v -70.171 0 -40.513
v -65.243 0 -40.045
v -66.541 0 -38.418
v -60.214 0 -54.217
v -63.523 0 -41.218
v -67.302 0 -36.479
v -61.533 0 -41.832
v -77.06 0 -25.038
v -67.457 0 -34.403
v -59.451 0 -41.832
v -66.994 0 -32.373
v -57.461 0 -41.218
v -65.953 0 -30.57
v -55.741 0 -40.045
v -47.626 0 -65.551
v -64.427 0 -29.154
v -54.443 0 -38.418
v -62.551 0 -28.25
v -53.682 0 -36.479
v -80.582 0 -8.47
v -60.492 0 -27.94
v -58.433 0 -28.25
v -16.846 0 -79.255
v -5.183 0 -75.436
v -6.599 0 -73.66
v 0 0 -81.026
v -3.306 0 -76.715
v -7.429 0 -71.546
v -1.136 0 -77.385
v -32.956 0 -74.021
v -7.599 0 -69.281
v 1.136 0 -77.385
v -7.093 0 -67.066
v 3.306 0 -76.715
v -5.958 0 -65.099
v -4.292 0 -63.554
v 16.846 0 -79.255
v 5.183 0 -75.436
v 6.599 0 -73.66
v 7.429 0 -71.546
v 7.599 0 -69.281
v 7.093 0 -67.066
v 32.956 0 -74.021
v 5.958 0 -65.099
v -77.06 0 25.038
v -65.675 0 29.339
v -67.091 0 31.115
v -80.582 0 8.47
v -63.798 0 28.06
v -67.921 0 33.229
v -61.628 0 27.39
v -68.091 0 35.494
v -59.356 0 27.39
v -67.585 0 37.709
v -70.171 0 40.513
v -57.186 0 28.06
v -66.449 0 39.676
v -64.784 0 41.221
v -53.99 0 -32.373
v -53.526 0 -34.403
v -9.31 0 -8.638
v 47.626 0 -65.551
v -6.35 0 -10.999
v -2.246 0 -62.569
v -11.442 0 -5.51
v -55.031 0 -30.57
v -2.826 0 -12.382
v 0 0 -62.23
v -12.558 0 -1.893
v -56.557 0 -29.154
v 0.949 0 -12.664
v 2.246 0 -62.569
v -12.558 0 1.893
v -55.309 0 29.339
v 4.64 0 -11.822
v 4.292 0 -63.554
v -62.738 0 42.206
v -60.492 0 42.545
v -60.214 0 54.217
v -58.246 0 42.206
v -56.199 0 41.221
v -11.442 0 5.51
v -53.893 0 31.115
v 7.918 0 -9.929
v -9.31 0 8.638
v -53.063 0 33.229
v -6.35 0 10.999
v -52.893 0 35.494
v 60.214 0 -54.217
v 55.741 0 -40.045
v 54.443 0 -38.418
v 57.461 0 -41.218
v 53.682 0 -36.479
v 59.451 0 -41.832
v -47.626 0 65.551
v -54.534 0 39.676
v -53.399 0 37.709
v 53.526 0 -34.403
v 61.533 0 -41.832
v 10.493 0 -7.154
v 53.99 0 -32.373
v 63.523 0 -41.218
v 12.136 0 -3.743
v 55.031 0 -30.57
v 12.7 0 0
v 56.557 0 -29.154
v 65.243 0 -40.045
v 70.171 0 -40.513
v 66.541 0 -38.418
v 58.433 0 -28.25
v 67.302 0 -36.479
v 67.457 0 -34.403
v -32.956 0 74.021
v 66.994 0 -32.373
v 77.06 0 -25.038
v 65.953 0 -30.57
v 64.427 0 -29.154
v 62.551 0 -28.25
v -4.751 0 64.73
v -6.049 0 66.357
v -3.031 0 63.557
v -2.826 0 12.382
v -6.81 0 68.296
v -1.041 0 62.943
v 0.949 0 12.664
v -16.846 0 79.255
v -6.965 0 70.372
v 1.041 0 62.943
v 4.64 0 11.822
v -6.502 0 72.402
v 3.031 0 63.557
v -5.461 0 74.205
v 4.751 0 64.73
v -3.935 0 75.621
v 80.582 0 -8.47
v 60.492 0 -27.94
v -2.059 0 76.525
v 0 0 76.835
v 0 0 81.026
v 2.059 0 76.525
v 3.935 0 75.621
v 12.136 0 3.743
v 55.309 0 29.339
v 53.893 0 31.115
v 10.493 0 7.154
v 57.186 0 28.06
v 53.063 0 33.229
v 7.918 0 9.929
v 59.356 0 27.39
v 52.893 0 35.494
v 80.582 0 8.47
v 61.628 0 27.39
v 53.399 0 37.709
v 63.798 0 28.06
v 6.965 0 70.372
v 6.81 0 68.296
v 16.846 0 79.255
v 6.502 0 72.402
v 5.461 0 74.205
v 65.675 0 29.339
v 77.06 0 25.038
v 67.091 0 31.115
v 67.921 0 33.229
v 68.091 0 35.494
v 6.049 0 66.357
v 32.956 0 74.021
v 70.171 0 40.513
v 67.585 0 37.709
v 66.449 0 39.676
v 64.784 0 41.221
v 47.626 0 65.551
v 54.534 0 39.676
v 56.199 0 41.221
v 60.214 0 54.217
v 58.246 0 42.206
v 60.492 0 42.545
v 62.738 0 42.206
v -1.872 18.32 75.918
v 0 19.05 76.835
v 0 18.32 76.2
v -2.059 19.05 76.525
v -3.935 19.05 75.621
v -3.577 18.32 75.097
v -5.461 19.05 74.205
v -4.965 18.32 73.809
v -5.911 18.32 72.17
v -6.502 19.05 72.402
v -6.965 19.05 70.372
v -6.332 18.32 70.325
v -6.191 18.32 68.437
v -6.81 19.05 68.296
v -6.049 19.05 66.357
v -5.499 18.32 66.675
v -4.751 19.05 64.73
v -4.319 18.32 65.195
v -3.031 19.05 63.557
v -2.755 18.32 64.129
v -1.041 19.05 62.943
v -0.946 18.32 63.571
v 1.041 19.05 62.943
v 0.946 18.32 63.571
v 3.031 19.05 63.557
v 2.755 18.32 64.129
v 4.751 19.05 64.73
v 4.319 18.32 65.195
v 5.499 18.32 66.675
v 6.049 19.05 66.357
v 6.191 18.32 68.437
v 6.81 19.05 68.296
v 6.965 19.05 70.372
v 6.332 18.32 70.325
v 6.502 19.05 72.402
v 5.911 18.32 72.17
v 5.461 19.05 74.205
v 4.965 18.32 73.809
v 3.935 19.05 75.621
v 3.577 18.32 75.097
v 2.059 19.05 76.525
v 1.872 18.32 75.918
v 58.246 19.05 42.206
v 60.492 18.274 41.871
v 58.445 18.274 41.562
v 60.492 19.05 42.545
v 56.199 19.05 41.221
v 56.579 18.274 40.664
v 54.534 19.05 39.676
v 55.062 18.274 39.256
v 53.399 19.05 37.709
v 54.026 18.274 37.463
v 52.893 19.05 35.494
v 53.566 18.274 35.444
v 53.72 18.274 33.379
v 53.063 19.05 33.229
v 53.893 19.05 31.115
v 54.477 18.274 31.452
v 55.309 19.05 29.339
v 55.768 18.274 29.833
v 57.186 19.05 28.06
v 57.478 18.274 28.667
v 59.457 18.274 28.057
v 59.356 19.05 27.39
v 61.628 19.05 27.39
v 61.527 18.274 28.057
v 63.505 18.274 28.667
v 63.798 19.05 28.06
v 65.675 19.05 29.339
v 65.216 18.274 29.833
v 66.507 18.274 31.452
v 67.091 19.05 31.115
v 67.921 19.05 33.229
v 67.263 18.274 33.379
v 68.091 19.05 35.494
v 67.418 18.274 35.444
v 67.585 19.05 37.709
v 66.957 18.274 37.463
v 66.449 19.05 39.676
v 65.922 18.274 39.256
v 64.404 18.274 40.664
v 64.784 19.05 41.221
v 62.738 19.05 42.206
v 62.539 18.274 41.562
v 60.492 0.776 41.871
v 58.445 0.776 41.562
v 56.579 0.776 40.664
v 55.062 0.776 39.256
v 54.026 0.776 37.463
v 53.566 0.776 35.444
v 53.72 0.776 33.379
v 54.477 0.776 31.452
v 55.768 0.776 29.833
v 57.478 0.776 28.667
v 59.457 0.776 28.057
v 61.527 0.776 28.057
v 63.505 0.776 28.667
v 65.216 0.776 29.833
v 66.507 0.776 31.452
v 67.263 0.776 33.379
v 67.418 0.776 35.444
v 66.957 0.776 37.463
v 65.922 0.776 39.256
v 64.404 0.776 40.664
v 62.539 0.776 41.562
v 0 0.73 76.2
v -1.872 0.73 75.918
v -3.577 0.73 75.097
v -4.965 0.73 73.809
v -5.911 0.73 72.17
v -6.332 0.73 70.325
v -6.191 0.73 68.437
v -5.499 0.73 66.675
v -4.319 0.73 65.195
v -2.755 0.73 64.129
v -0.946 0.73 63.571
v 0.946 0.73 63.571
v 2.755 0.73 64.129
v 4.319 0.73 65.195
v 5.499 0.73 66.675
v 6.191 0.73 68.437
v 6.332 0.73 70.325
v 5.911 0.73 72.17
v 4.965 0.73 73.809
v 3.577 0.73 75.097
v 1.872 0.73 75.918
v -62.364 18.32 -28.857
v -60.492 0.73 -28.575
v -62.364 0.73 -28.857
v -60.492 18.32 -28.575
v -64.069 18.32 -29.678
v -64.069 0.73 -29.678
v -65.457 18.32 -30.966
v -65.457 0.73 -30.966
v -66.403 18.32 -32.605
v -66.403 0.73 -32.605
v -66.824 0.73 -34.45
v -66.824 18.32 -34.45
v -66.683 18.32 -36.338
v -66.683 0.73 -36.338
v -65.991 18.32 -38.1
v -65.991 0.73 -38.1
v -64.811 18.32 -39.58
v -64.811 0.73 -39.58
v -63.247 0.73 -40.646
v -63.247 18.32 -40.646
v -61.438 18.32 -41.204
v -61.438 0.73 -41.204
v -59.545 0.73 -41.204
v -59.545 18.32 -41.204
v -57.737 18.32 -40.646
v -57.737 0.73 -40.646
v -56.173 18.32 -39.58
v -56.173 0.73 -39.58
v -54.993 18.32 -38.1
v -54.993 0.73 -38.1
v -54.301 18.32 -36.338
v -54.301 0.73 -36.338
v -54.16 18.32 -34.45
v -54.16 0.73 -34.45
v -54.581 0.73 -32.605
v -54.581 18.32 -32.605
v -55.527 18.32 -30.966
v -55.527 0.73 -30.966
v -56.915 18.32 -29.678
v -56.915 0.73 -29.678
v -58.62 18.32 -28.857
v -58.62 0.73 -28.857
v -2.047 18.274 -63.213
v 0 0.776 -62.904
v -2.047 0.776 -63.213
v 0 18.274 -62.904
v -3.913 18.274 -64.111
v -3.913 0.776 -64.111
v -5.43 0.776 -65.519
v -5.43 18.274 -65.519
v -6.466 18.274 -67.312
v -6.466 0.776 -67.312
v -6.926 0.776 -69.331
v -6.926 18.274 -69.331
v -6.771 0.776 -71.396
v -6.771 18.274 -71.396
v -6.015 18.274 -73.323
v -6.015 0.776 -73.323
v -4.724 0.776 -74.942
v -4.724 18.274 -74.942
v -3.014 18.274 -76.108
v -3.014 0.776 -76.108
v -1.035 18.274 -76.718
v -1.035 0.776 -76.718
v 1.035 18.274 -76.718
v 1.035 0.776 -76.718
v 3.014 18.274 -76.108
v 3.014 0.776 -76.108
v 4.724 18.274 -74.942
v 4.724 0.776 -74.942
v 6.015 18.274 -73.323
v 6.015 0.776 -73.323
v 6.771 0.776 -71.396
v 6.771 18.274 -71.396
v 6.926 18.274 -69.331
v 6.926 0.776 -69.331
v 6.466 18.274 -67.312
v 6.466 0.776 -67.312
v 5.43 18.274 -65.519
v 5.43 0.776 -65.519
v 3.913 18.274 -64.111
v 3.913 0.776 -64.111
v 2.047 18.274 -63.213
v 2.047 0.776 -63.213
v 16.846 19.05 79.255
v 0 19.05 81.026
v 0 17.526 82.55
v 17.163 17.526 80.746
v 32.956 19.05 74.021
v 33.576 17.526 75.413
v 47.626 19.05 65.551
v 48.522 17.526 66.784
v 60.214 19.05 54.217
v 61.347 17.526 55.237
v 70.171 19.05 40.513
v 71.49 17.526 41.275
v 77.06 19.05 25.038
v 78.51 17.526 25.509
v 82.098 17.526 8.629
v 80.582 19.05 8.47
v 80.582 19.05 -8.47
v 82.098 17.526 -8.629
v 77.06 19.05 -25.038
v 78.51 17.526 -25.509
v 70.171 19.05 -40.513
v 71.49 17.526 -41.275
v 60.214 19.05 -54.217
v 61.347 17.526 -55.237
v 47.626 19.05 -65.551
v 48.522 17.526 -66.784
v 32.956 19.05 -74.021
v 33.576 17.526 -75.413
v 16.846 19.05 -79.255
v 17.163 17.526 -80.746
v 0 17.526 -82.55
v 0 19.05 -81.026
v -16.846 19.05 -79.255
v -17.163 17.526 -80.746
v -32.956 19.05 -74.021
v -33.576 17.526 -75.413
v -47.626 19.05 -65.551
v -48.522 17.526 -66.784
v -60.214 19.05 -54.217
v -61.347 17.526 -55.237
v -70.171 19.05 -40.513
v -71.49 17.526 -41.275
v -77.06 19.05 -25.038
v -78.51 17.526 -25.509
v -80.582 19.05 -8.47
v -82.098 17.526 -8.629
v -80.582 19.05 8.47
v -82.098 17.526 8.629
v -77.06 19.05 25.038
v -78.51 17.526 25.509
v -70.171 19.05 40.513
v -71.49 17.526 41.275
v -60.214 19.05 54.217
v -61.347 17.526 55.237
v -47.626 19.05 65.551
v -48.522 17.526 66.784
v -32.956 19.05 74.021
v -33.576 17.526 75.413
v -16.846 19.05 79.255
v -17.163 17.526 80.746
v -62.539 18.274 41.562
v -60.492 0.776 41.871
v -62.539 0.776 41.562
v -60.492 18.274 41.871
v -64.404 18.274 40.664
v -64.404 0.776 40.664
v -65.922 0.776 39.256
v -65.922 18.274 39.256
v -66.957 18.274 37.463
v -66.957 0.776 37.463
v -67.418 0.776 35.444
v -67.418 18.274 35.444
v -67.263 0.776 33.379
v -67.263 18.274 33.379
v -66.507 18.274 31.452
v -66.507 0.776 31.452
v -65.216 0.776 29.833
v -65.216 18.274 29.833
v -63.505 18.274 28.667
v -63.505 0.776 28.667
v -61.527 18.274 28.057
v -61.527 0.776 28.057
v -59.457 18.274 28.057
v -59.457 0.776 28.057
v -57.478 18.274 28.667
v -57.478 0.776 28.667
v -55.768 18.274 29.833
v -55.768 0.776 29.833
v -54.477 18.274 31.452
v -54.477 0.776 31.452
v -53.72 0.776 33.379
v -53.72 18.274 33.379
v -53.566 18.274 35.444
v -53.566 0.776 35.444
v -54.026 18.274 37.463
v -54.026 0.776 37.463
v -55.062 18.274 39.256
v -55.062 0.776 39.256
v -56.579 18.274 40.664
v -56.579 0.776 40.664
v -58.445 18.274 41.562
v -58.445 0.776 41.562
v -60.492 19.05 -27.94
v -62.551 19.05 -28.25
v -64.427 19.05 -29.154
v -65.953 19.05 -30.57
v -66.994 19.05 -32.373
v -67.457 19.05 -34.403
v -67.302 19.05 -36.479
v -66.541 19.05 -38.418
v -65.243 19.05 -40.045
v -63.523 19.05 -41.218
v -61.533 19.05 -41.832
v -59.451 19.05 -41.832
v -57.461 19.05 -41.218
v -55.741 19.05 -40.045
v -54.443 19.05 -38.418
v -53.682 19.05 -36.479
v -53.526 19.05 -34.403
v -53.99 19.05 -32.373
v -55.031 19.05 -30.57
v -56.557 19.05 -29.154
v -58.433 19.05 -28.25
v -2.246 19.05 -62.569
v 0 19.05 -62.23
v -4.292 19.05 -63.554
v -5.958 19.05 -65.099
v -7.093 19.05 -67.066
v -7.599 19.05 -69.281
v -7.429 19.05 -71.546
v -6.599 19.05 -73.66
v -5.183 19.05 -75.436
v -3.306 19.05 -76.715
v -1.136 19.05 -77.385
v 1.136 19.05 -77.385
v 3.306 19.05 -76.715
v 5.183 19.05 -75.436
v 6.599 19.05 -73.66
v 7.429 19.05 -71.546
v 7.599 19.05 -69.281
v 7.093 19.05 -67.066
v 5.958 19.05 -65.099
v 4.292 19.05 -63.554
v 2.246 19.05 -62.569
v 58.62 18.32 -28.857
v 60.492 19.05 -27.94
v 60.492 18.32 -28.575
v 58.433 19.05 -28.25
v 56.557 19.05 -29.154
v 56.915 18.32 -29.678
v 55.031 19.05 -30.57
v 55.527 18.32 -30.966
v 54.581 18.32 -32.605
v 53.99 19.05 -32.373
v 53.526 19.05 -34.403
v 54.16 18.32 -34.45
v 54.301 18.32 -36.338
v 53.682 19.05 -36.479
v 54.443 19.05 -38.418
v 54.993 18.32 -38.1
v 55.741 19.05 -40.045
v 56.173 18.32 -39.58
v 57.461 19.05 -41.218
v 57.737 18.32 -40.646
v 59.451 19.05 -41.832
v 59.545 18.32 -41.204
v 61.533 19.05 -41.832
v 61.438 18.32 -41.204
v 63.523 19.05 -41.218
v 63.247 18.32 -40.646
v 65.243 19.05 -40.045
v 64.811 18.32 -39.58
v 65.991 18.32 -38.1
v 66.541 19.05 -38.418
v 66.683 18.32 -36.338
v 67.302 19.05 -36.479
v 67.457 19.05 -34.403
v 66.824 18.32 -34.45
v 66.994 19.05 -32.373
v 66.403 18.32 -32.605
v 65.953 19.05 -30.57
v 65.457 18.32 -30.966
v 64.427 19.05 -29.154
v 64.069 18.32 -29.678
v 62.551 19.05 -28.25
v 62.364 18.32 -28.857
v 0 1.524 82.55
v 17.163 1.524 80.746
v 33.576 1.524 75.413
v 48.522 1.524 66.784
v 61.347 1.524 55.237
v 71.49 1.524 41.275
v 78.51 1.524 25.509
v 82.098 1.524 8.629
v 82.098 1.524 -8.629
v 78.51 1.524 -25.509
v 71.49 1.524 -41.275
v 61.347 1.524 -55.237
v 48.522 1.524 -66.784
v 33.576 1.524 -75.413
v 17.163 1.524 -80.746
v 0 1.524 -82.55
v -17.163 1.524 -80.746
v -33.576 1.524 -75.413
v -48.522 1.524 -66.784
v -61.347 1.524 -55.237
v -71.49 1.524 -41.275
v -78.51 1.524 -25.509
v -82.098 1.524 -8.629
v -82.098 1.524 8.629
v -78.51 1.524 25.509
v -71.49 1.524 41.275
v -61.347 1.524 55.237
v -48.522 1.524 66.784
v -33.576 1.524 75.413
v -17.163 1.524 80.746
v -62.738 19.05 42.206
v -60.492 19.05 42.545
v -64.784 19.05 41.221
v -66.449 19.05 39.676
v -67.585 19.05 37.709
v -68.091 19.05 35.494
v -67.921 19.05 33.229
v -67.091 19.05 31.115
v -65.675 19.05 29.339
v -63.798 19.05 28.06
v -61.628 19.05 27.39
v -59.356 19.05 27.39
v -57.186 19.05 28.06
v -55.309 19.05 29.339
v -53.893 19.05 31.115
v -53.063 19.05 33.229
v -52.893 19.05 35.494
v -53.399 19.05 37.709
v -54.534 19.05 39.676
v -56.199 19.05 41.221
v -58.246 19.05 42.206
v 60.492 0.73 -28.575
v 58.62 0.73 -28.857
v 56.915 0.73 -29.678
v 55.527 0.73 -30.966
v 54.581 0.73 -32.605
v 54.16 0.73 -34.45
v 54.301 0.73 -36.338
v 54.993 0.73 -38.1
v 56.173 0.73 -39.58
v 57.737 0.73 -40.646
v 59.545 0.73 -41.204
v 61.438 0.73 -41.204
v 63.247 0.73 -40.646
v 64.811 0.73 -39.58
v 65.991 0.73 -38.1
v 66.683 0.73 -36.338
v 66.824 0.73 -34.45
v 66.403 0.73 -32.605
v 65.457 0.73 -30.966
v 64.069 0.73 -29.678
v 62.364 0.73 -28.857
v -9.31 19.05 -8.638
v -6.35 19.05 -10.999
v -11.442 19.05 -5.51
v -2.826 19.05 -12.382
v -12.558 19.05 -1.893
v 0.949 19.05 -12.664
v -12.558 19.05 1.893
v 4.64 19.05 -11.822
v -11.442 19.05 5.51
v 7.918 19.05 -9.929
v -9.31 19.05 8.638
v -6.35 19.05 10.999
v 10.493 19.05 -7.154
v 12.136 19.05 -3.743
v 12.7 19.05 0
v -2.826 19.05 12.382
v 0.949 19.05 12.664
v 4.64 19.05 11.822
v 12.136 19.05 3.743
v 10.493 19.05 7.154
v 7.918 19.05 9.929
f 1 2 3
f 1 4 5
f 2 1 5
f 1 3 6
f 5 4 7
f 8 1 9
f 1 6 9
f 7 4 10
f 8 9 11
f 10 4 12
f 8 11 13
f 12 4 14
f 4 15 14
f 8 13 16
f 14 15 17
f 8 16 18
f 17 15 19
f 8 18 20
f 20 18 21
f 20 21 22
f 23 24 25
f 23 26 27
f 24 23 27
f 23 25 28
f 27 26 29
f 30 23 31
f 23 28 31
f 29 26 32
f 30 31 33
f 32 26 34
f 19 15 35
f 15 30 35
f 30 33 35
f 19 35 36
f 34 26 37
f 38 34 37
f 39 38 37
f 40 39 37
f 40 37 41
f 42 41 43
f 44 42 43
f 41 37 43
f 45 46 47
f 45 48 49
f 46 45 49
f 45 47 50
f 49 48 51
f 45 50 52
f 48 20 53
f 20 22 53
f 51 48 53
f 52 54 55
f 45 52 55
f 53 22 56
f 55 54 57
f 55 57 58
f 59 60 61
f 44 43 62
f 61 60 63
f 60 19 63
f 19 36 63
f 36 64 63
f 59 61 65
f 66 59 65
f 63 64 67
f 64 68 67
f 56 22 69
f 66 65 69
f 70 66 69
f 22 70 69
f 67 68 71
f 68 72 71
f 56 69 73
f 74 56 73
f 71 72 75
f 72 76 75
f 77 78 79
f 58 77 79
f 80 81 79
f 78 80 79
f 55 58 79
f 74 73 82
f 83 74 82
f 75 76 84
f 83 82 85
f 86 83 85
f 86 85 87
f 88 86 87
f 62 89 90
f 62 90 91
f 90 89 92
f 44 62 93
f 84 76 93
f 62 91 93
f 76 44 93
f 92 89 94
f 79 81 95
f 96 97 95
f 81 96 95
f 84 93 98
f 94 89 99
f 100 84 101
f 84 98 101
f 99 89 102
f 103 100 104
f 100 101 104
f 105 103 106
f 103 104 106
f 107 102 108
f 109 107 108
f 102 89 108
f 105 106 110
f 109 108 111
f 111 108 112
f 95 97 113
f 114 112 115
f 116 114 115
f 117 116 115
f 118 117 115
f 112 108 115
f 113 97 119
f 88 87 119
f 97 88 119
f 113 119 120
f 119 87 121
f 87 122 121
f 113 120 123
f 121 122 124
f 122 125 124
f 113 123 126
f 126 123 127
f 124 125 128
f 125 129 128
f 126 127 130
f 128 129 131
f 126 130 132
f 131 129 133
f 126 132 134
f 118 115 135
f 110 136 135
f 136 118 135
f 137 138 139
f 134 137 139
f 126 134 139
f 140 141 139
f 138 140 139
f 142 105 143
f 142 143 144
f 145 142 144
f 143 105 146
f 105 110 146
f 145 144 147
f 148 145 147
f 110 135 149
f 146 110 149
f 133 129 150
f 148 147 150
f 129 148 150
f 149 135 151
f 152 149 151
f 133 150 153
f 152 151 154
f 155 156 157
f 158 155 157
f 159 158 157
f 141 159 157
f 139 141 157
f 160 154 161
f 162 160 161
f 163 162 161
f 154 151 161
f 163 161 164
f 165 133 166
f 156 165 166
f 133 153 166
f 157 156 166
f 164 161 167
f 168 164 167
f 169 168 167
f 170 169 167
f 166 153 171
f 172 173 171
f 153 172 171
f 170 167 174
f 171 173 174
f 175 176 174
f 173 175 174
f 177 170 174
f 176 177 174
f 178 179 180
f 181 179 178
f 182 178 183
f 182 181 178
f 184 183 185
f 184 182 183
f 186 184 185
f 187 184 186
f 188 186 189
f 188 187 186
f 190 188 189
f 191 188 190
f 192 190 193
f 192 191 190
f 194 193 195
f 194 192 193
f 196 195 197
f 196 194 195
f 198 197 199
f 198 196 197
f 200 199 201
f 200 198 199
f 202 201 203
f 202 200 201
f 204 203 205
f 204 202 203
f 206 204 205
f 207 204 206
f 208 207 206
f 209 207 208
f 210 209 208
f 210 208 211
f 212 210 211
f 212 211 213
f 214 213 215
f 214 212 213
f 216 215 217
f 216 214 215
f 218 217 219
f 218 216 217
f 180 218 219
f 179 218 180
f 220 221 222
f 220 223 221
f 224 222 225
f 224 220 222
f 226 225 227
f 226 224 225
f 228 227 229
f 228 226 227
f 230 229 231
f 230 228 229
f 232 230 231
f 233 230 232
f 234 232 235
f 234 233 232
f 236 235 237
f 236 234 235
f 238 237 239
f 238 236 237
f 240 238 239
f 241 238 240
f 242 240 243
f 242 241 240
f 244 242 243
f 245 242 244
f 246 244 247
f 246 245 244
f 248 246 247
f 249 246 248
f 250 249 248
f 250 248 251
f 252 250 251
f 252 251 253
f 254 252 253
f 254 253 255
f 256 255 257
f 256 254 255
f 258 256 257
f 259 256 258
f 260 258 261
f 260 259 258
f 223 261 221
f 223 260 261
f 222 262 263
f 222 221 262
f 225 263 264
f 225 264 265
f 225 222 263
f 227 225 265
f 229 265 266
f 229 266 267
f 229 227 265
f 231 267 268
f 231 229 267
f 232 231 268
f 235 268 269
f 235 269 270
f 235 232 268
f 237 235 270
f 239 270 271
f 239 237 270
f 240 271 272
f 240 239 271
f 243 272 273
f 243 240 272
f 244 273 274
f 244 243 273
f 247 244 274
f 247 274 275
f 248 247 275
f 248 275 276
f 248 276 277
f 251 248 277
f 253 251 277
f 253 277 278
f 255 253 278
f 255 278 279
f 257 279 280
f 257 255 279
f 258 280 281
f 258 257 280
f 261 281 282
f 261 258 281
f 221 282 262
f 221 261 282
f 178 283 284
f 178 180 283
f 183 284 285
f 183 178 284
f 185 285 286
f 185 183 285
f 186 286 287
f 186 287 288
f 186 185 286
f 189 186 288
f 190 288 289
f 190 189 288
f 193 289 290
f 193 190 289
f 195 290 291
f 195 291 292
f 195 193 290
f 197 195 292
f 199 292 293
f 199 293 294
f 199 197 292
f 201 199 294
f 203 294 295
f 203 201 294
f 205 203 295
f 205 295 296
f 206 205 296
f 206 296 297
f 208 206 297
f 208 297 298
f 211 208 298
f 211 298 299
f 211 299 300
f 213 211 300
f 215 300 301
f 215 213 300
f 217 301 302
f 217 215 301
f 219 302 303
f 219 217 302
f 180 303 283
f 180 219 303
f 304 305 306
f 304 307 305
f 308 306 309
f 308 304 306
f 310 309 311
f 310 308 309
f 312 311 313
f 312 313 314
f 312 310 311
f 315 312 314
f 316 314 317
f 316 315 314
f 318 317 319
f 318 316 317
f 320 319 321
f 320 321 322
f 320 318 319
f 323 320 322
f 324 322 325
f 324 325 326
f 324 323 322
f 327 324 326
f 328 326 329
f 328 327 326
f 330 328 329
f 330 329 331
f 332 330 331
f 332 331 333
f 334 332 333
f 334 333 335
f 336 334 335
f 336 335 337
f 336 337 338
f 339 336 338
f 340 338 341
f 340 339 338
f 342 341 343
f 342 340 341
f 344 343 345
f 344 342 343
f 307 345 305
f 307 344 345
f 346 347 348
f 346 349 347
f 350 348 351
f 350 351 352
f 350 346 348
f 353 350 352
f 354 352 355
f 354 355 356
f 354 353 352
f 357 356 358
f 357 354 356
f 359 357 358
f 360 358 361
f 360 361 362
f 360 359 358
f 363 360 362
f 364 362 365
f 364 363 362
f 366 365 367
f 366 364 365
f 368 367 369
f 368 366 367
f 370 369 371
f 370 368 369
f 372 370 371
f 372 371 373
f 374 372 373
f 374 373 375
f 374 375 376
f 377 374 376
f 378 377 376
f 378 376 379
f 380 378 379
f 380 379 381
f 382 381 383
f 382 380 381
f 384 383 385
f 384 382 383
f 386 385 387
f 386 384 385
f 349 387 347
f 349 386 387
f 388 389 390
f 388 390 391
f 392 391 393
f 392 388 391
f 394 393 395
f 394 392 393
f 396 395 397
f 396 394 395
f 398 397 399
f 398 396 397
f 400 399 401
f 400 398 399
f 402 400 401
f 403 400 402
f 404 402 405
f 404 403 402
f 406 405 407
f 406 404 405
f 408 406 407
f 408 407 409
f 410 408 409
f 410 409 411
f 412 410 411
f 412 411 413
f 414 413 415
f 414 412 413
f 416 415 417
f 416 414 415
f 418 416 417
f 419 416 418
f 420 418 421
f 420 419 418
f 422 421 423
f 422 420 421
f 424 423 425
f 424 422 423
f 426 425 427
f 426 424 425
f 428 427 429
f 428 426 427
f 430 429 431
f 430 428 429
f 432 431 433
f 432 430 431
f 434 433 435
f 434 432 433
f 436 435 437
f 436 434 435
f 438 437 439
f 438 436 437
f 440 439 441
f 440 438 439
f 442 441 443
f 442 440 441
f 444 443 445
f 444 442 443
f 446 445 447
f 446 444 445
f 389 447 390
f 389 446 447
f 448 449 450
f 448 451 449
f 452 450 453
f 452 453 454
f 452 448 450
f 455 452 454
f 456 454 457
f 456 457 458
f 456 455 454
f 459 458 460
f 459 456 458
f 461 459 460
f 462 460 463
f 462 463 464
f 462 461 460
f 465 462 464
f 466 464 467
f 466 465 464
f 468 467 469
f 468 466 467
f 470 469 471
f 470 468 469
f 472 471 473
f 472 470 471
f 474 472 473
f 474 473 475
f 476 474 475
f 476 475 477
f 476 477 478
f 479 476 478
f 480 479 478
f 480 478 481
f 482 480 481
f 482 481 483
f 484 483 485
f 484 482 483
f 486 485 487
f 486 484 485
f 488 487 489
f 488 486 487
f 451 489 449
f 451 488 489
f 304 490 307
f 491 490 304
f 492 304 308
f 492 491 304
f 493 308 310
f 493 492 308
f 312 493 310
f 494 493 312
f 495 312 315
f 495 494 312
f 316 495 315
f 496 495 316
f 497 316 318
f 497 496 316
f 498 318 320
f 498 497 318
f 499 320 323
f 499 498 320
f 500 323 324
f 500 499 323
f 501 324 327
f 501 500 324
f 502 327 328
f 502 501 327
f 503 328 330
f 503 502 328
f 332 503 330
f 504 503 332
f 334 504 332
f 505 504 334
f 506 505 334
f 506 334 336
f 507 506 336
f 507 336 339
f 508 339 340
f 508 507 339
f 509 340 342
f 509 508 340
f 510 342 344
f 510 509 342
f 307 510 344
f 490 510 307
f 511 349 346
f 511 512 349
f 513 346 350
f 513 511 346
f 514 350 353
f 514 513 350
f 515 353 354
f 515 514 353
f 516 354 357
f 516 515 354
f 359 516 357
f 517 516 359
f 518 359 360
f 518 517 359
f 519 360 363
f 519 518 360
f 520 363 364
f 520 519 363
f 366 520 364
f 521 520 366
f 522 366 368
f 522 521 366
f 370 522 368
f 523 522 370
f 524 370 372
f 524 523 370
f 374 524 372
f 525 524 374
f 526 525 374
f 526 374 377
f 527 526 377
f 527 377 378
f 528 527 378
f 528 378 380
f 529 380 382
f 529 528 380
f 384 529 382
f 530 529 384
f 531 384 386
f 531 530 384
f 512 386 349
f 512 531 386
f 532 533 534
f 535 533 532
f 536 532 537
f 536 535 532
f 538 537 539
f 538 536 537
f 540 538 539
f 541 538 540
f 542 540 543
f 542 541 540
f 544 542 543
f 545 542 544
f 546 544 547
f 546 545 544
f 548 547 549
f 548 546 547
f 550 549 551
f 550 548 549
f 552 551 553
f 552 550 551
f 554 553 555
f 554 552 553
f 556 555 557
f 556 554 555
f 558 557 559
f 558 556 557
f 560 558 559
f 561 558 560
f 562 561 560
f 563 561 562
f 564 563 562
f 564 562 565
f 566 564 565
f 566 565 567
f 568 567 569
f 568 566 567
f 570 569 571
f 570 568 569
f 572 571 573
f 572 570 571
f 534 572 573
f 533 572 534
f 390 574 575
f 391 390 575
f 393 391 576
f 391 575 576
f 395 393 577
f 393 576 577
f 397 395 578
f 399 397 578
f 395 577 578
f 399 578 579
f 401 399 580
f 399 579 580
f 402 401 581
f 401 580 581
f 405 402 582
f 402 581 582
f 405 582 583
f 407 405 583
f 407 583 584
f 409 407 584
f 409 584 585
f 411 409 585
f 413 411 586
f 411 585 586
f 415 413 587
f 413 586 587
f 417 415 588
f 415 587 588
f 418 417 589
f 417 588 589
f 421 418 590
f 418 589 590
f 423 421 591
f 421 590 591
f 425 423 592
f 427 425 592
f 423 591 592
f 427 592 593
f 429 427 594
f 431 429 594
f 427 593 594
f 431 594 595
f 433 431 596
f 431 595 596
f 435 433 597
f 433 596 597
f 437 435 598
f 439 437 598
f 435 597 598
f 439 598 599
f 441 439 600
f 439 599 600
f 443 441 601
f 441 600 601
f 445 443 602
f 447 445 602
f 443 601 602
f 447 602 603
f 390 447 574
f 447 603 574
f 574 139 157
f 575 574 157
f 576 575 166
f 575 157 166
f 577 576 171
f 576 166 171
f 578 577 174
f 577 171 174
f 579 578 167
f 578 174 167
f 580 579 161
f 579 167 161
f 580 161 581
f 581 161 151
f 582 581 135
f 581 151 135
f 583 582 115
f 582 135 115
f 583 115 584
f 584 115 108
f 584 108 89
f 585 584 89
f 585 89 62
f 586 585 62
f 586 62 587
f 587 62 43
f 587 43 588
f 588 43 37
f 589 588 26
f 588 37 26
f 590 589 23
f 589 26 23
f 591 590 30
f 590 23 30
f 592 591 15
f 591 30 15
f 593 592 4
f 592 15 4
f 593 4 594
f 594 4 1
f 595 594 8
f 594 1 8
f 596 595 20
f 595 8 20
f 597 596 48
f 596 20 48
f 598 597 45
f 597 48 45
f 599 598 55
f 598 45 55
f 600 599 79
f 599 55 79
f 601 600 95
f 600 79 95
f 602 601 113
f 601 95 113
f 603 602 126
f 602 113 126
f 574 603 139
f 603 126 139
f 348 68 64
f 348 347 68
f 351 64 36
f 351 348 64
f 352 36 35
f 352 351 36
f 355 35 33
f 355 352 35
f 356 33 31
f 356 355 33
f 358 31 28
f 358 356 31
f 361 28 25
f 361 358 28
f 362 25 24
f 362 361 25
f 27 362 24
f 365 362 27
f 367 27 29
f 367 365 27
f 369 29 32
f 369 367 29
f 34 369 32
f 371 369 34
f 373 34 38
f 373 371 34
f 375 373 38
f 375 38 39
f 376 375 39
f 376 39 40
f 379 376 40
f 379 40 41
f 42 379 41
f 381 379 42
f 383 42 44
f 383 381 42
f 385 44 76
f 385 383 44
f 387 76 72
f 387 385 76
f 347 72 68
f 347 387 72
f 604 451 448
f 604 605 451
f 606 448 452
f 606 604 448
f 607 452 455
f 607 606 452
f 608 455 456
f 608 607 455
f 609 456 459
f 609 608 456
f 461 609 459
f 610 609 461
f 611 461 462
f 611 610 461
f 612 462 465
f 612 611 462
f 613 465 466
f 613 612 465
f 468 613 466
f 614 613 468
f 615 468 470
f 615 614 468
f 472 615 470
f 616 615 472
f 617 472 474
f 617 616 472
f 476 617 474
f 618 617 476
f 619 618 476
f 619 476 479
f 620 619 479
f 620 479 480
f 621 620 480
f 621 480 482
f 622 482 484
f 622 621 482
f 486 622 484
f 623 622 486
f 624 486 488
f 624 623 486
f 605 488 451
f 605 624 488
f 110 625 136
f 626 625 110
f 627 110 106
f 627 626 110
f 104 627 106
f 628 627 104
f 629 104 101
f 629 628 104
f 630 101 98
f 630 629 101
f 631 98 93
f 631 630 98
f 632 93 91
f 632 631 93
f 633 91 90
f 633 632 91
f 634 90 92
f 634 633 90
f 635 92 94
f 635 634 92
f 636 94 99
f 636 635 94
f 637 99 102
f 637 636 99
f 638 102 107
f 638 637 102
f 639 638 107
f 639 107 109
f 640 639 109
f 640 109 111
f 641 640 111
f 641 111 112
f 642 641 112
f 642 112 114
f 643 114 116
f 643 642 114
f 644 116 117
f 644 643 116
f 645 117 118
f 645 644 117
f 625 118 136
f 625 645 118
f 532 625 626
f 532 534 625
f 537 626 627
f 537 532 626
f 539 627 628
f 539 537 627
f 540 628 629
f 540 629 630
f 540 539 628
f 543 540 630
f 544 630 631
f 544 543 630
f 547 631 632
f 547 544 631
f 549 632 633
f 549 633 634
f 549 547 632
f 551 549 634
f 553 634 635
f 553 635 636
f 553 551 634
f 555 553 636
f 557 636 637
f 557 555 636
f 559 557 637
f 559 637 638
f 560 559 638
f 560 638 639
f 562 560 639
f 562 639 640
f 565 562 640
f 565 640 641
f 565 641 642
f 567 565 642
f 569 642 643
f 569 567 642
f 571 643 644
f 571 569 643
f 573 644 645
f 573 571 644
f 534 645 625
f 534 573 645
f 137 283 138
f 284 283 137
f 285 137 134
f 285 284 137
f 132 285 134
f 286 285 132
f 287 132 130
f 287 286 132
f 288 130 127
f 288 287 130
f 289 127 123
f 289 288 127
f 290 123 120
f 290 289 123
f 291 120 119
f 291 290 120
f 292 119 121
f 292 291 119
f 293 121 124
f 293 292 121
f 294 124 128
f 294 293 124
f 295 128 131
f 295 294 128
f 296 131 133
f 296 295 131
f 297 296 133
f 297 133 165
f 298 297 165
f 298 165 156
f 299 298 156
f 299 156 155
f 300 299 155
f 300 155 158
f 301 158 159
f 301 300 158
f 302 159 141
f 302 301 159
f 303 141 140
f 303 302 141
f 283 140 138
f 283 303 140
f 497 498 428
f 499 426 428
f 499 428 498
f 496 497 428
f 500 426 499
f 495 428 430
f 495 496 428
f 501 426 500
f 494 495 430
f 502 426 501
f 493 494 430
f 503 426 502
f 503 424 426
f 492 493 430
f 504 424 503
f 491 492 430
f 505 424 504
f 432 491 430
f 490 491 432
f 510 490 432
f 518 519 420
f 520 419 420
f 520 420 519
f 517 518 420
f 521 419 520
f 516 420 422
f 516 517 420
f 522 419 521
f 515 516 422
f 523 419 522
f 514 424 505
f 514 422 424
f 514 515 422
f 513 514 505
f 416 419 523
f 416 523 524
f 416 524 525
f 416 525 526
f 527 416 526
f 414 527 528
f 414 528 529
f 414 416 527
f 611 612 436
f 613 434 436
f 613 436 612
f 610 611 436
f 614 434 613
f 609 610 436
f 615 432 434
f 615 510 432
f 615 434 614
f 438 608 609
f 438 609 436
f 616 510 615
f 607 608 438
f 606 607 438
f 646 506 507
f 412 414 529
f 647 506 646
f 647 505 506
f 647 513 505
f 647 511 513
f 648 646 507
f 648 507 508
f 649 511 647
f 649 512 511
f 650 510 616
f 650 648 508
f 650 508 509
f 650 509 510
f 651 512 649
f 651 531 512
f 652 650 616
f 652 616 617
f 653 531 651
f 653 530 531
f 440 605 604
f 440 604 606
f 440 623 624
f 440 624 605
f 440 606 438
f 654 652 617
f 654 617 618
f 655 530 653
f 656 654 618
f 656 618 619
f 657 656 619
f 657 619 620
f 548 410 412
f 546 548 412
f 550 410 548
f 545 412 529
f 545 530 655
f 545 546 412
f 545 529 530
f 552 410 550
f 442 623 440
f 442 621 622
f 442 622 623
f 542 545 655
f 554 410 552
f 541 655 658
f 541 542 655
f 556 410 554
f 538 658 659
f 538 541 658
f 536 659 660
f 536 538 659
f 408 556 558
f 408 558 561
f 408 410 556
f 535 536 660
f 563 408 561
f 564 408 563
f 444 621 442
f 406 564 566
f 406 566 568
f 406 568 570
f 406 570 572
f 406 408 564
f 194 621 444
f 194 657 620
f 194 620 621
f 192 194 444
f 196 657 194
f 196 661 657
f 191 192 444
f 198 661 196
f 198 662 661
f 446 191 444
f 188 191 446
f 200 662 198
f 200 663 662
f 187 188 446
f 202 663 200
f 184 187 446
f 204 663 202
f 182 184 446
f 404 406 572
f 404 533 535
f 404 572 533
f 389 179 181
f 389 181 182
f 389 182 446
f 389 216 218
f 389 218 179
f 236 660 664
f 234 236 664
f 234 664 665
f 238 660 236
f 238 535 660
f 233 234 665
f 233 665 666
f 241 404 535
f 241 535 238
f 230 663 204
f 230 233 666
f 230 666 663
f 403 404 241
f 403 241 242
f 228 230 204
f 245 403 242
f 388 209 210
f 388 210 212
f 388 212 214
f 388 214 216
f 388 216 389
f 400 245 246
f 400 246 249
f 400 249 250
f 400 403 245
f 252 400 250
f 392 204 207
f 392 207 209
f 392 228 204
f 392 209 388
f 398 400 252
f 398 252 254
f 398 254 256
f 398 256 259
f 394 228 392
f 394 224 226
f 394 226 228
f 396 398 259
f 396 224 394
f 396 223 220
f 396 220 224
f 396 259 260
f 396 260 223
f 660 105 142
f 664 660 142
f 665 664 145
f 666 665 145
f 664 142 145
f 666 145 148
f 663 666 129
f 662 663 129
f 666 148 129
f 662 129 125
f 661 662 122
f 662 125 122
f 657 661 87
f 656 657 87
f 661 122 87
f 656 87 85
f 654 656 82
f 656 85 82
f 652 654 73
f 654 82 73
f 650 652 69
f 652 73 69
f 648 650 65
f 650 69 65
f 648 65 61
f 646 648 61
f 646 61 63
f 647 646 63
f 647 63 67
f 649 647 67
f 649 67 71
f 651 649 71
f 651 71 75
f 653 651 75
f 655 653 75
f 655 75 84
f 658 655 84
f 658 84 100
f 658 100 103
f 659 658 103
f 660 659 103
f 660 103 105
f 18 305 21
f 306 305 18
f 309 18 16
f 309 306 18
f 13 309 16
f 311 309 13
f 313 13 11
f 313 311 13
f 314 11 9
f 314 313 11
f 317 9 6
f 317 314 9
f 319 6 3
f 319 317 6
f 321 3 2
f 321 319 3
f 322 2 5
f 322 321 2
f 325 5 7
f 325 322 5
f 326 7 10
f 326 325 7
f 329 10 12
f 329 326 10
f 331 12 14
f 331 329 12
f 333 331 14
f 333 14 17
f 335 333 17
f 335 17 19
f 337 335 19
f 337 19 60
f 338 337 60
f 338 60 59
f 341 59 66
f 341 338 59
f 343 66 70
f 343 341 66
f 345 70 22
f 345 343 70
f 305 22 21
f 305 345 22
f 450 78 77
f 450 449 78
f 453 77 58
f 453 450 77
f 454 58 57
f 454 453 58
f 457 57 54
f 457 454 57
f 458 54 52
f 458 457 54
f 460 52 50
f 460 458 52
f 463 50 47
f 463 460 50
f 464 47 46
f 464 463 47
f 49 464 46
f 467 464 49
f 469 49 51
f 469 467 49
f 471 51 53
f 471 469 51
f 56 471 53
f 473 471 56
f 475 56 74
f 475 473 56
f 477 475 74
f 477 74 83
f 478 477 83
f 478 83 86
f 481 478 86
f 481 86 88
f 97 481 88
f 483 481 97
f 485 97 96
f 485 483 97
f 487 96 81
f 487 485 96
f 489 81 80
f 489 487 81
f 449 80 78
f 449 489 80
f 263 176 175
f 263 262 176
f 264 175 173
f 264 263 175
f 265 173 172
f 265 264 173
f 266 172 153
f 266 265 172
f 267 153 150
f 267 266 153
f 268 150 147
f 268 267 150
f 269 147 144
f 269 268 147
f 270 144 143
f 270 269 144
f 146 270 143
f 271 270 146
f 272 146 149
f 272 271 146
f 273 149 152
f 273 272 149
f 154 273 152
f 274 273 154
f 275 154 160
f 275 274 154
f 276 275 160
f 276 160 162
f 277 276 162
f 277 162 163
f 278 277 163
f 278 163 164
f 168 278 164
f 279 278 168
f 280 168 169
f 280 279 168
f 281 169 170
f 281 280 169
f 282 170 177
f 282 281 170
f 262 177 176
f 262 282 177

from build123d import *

# Parameters (mm, degrees)
SKETCH1_R                        = 82.55
EXTRUDE1_DEPTH                   = 19.05
F_1_1_DIAMETER_HOLE2_D           = 25.4
F_1_1_DIAMETER_HOLE2_DEPTH       = 19.05
F_1_2_20_TAPPED_HOLE1_AT_2_COUNT = 2
F_1_2_20_TAPPED_HOLE1_AT_2_PITCH = 120.983748909
F_1_2_20_TAPPED_HOLE1_AT_3_COUNT = 2
F_1_2_20_TAPPED_HOLE1_AT_3_PITCH = 120.983748909
F_1_2_CLEARANCE_HOLE1_AT_2_COUNT = 2
F_1_2_CLEARANCE_HOLE1_AT_2_PITCH = 120.983748909
F_1_2_CLEARANCE_HOLE1_AT_3_COUNT = 2
F_1_2_CLEARANCE_HOLE1_AT_3_PITCH = 120.983748909
CHAMFER6_SIZE                    = 1.524


with BuildPart() as part:
    # Sketch1 → Extrude1 (new body)
    with BuildSketch(Plane(origin=(0, 0, 0), x_dir=(1, 0, 0), z_dir=(0, 1, 0))):
        with Locations(Location((0, 0, 0), (0, 0, 270))):  # turned: the seam where the file's is
            Circle(SKETCH1_R)
    extrude(amount=EXTRUDE1_DEPTH)

    # 1 _1_ Diameter Hole2
    with Locations(Plane(origin=(0, 19.05, 0), x_dir=(-1, 0, 0), z_dir=(0, 1, 0))):
        with Locations((0, 0)):
            Hole(F_1_1_DIAMETER_HOLE2_D / 2, depth=F_1_1_DIAMETER_HOLE2_DEPTH)

    # Sketch12 → 1_2-20 Tapped Hole1 (revolve, cut)
    with BuildSketch(Plane(origin=(0, 19.05, 69.85), x_dir=(0, 0, 1), z_dir=(1, 0, 0))):
        Polygon((0, 0), (0, 19.05), (6.985, 19.05), (6.35, 18.319516061), (6.35, 0.730483939), (6.985, 0), align=None)
    f_1_2_20_tapped_hole1 = revolve(axis=Axis((0, 25.4, 69.85), (0, -1, 0)), mode=Mode.SUBTRACT)

    # 1_2-20 Tapped Hole1 at 2: 1_2-20 Tapped Hole1 ×2
    with Locations(*[Vector(-0.5, 0, -0.866025404) * (i * F_1_2_20_TAPPED_HOLE1_AT_2_PITCH) for i in range(1, F_1_2_20_TAPPED_HOLE1_AT_2_COUNT)]):
        add(f_1_2_20_tapped_hole1, mode=Mode.SUBTRACT)

    # 1_2-20 Tapped Hole1 at 3: 1_2-20 Tapped Hole1 ×2
    with Locations(*[Vector(0.5, 0, -0.866025404) * (i * F_1_2_20_TAPPED_HOLE1_AT_3_PITCH) for i in range(1, F_1_2_20_TAPPED_HOLE1_AT_3_COUNT)]):
        add(f_1_2_20_tapped_hole1, mode=Mode.SUBTRACT)

    # Sketch14 → 1_2 Clearance Hole1 (revolve, cut)
    with BuildSketch(Plane(origin=(0, 19.05, -69.85), x_dir=(0, 0, 1), z_dir=(1, 0, 0))):
        Polygon((0, 0), (0, 19.05), (7.62, 19.05), (6.94563, 18.274226057), (6.94563, 0.775773943), (7.62, 0), align=None)
    f_1_2_clearance_hole1 = revolve(axis=Axis((0, 25.4, -69.85), (0, -1, 0)), mode=Mode.SUBTRACT)

    # 1_2 Clearance Hole1 at 2: 1_2 Clearance Hole1 ×2
    with Locations(*[Vector(-0.5, 0, 0.866025404) * (i * F_1_2_CLEARANCE_HOLE1_AT_2_PITCH) for i in range(1, F_1_2_CLEARANCE_HOLE1_AT_2_COUNT)]):
        add(f_1_2_clearance_hole1, mode=Mode.SUBTRACT)

    # 1_2 Clearance Hole1 at 3: 1_2 Clearance Hole1 ×2
    with Locations(*[Vector(0.5, 0, 0.866025404) * (i * F_1_2_CLEARANCE_HOLE1_AT_3_PITCH) for i in range(1, F_1_2_CLEARANCE_HOLE1_AT_3_COUNT)]):
        add(f_1_2_clearance_hole1, mode=Mode.SUBTRACT)

    # Chamfer6
    chamfer6_edges = [part.edges().sort_by_distance(p)[0] for p in [
        (0, 0, -82.55),
        (0, 19.05, -82.55),
    ]]
    chamfer(chamfer6_edges, length=CHAMFER6_SIZE)


solid = part.part
